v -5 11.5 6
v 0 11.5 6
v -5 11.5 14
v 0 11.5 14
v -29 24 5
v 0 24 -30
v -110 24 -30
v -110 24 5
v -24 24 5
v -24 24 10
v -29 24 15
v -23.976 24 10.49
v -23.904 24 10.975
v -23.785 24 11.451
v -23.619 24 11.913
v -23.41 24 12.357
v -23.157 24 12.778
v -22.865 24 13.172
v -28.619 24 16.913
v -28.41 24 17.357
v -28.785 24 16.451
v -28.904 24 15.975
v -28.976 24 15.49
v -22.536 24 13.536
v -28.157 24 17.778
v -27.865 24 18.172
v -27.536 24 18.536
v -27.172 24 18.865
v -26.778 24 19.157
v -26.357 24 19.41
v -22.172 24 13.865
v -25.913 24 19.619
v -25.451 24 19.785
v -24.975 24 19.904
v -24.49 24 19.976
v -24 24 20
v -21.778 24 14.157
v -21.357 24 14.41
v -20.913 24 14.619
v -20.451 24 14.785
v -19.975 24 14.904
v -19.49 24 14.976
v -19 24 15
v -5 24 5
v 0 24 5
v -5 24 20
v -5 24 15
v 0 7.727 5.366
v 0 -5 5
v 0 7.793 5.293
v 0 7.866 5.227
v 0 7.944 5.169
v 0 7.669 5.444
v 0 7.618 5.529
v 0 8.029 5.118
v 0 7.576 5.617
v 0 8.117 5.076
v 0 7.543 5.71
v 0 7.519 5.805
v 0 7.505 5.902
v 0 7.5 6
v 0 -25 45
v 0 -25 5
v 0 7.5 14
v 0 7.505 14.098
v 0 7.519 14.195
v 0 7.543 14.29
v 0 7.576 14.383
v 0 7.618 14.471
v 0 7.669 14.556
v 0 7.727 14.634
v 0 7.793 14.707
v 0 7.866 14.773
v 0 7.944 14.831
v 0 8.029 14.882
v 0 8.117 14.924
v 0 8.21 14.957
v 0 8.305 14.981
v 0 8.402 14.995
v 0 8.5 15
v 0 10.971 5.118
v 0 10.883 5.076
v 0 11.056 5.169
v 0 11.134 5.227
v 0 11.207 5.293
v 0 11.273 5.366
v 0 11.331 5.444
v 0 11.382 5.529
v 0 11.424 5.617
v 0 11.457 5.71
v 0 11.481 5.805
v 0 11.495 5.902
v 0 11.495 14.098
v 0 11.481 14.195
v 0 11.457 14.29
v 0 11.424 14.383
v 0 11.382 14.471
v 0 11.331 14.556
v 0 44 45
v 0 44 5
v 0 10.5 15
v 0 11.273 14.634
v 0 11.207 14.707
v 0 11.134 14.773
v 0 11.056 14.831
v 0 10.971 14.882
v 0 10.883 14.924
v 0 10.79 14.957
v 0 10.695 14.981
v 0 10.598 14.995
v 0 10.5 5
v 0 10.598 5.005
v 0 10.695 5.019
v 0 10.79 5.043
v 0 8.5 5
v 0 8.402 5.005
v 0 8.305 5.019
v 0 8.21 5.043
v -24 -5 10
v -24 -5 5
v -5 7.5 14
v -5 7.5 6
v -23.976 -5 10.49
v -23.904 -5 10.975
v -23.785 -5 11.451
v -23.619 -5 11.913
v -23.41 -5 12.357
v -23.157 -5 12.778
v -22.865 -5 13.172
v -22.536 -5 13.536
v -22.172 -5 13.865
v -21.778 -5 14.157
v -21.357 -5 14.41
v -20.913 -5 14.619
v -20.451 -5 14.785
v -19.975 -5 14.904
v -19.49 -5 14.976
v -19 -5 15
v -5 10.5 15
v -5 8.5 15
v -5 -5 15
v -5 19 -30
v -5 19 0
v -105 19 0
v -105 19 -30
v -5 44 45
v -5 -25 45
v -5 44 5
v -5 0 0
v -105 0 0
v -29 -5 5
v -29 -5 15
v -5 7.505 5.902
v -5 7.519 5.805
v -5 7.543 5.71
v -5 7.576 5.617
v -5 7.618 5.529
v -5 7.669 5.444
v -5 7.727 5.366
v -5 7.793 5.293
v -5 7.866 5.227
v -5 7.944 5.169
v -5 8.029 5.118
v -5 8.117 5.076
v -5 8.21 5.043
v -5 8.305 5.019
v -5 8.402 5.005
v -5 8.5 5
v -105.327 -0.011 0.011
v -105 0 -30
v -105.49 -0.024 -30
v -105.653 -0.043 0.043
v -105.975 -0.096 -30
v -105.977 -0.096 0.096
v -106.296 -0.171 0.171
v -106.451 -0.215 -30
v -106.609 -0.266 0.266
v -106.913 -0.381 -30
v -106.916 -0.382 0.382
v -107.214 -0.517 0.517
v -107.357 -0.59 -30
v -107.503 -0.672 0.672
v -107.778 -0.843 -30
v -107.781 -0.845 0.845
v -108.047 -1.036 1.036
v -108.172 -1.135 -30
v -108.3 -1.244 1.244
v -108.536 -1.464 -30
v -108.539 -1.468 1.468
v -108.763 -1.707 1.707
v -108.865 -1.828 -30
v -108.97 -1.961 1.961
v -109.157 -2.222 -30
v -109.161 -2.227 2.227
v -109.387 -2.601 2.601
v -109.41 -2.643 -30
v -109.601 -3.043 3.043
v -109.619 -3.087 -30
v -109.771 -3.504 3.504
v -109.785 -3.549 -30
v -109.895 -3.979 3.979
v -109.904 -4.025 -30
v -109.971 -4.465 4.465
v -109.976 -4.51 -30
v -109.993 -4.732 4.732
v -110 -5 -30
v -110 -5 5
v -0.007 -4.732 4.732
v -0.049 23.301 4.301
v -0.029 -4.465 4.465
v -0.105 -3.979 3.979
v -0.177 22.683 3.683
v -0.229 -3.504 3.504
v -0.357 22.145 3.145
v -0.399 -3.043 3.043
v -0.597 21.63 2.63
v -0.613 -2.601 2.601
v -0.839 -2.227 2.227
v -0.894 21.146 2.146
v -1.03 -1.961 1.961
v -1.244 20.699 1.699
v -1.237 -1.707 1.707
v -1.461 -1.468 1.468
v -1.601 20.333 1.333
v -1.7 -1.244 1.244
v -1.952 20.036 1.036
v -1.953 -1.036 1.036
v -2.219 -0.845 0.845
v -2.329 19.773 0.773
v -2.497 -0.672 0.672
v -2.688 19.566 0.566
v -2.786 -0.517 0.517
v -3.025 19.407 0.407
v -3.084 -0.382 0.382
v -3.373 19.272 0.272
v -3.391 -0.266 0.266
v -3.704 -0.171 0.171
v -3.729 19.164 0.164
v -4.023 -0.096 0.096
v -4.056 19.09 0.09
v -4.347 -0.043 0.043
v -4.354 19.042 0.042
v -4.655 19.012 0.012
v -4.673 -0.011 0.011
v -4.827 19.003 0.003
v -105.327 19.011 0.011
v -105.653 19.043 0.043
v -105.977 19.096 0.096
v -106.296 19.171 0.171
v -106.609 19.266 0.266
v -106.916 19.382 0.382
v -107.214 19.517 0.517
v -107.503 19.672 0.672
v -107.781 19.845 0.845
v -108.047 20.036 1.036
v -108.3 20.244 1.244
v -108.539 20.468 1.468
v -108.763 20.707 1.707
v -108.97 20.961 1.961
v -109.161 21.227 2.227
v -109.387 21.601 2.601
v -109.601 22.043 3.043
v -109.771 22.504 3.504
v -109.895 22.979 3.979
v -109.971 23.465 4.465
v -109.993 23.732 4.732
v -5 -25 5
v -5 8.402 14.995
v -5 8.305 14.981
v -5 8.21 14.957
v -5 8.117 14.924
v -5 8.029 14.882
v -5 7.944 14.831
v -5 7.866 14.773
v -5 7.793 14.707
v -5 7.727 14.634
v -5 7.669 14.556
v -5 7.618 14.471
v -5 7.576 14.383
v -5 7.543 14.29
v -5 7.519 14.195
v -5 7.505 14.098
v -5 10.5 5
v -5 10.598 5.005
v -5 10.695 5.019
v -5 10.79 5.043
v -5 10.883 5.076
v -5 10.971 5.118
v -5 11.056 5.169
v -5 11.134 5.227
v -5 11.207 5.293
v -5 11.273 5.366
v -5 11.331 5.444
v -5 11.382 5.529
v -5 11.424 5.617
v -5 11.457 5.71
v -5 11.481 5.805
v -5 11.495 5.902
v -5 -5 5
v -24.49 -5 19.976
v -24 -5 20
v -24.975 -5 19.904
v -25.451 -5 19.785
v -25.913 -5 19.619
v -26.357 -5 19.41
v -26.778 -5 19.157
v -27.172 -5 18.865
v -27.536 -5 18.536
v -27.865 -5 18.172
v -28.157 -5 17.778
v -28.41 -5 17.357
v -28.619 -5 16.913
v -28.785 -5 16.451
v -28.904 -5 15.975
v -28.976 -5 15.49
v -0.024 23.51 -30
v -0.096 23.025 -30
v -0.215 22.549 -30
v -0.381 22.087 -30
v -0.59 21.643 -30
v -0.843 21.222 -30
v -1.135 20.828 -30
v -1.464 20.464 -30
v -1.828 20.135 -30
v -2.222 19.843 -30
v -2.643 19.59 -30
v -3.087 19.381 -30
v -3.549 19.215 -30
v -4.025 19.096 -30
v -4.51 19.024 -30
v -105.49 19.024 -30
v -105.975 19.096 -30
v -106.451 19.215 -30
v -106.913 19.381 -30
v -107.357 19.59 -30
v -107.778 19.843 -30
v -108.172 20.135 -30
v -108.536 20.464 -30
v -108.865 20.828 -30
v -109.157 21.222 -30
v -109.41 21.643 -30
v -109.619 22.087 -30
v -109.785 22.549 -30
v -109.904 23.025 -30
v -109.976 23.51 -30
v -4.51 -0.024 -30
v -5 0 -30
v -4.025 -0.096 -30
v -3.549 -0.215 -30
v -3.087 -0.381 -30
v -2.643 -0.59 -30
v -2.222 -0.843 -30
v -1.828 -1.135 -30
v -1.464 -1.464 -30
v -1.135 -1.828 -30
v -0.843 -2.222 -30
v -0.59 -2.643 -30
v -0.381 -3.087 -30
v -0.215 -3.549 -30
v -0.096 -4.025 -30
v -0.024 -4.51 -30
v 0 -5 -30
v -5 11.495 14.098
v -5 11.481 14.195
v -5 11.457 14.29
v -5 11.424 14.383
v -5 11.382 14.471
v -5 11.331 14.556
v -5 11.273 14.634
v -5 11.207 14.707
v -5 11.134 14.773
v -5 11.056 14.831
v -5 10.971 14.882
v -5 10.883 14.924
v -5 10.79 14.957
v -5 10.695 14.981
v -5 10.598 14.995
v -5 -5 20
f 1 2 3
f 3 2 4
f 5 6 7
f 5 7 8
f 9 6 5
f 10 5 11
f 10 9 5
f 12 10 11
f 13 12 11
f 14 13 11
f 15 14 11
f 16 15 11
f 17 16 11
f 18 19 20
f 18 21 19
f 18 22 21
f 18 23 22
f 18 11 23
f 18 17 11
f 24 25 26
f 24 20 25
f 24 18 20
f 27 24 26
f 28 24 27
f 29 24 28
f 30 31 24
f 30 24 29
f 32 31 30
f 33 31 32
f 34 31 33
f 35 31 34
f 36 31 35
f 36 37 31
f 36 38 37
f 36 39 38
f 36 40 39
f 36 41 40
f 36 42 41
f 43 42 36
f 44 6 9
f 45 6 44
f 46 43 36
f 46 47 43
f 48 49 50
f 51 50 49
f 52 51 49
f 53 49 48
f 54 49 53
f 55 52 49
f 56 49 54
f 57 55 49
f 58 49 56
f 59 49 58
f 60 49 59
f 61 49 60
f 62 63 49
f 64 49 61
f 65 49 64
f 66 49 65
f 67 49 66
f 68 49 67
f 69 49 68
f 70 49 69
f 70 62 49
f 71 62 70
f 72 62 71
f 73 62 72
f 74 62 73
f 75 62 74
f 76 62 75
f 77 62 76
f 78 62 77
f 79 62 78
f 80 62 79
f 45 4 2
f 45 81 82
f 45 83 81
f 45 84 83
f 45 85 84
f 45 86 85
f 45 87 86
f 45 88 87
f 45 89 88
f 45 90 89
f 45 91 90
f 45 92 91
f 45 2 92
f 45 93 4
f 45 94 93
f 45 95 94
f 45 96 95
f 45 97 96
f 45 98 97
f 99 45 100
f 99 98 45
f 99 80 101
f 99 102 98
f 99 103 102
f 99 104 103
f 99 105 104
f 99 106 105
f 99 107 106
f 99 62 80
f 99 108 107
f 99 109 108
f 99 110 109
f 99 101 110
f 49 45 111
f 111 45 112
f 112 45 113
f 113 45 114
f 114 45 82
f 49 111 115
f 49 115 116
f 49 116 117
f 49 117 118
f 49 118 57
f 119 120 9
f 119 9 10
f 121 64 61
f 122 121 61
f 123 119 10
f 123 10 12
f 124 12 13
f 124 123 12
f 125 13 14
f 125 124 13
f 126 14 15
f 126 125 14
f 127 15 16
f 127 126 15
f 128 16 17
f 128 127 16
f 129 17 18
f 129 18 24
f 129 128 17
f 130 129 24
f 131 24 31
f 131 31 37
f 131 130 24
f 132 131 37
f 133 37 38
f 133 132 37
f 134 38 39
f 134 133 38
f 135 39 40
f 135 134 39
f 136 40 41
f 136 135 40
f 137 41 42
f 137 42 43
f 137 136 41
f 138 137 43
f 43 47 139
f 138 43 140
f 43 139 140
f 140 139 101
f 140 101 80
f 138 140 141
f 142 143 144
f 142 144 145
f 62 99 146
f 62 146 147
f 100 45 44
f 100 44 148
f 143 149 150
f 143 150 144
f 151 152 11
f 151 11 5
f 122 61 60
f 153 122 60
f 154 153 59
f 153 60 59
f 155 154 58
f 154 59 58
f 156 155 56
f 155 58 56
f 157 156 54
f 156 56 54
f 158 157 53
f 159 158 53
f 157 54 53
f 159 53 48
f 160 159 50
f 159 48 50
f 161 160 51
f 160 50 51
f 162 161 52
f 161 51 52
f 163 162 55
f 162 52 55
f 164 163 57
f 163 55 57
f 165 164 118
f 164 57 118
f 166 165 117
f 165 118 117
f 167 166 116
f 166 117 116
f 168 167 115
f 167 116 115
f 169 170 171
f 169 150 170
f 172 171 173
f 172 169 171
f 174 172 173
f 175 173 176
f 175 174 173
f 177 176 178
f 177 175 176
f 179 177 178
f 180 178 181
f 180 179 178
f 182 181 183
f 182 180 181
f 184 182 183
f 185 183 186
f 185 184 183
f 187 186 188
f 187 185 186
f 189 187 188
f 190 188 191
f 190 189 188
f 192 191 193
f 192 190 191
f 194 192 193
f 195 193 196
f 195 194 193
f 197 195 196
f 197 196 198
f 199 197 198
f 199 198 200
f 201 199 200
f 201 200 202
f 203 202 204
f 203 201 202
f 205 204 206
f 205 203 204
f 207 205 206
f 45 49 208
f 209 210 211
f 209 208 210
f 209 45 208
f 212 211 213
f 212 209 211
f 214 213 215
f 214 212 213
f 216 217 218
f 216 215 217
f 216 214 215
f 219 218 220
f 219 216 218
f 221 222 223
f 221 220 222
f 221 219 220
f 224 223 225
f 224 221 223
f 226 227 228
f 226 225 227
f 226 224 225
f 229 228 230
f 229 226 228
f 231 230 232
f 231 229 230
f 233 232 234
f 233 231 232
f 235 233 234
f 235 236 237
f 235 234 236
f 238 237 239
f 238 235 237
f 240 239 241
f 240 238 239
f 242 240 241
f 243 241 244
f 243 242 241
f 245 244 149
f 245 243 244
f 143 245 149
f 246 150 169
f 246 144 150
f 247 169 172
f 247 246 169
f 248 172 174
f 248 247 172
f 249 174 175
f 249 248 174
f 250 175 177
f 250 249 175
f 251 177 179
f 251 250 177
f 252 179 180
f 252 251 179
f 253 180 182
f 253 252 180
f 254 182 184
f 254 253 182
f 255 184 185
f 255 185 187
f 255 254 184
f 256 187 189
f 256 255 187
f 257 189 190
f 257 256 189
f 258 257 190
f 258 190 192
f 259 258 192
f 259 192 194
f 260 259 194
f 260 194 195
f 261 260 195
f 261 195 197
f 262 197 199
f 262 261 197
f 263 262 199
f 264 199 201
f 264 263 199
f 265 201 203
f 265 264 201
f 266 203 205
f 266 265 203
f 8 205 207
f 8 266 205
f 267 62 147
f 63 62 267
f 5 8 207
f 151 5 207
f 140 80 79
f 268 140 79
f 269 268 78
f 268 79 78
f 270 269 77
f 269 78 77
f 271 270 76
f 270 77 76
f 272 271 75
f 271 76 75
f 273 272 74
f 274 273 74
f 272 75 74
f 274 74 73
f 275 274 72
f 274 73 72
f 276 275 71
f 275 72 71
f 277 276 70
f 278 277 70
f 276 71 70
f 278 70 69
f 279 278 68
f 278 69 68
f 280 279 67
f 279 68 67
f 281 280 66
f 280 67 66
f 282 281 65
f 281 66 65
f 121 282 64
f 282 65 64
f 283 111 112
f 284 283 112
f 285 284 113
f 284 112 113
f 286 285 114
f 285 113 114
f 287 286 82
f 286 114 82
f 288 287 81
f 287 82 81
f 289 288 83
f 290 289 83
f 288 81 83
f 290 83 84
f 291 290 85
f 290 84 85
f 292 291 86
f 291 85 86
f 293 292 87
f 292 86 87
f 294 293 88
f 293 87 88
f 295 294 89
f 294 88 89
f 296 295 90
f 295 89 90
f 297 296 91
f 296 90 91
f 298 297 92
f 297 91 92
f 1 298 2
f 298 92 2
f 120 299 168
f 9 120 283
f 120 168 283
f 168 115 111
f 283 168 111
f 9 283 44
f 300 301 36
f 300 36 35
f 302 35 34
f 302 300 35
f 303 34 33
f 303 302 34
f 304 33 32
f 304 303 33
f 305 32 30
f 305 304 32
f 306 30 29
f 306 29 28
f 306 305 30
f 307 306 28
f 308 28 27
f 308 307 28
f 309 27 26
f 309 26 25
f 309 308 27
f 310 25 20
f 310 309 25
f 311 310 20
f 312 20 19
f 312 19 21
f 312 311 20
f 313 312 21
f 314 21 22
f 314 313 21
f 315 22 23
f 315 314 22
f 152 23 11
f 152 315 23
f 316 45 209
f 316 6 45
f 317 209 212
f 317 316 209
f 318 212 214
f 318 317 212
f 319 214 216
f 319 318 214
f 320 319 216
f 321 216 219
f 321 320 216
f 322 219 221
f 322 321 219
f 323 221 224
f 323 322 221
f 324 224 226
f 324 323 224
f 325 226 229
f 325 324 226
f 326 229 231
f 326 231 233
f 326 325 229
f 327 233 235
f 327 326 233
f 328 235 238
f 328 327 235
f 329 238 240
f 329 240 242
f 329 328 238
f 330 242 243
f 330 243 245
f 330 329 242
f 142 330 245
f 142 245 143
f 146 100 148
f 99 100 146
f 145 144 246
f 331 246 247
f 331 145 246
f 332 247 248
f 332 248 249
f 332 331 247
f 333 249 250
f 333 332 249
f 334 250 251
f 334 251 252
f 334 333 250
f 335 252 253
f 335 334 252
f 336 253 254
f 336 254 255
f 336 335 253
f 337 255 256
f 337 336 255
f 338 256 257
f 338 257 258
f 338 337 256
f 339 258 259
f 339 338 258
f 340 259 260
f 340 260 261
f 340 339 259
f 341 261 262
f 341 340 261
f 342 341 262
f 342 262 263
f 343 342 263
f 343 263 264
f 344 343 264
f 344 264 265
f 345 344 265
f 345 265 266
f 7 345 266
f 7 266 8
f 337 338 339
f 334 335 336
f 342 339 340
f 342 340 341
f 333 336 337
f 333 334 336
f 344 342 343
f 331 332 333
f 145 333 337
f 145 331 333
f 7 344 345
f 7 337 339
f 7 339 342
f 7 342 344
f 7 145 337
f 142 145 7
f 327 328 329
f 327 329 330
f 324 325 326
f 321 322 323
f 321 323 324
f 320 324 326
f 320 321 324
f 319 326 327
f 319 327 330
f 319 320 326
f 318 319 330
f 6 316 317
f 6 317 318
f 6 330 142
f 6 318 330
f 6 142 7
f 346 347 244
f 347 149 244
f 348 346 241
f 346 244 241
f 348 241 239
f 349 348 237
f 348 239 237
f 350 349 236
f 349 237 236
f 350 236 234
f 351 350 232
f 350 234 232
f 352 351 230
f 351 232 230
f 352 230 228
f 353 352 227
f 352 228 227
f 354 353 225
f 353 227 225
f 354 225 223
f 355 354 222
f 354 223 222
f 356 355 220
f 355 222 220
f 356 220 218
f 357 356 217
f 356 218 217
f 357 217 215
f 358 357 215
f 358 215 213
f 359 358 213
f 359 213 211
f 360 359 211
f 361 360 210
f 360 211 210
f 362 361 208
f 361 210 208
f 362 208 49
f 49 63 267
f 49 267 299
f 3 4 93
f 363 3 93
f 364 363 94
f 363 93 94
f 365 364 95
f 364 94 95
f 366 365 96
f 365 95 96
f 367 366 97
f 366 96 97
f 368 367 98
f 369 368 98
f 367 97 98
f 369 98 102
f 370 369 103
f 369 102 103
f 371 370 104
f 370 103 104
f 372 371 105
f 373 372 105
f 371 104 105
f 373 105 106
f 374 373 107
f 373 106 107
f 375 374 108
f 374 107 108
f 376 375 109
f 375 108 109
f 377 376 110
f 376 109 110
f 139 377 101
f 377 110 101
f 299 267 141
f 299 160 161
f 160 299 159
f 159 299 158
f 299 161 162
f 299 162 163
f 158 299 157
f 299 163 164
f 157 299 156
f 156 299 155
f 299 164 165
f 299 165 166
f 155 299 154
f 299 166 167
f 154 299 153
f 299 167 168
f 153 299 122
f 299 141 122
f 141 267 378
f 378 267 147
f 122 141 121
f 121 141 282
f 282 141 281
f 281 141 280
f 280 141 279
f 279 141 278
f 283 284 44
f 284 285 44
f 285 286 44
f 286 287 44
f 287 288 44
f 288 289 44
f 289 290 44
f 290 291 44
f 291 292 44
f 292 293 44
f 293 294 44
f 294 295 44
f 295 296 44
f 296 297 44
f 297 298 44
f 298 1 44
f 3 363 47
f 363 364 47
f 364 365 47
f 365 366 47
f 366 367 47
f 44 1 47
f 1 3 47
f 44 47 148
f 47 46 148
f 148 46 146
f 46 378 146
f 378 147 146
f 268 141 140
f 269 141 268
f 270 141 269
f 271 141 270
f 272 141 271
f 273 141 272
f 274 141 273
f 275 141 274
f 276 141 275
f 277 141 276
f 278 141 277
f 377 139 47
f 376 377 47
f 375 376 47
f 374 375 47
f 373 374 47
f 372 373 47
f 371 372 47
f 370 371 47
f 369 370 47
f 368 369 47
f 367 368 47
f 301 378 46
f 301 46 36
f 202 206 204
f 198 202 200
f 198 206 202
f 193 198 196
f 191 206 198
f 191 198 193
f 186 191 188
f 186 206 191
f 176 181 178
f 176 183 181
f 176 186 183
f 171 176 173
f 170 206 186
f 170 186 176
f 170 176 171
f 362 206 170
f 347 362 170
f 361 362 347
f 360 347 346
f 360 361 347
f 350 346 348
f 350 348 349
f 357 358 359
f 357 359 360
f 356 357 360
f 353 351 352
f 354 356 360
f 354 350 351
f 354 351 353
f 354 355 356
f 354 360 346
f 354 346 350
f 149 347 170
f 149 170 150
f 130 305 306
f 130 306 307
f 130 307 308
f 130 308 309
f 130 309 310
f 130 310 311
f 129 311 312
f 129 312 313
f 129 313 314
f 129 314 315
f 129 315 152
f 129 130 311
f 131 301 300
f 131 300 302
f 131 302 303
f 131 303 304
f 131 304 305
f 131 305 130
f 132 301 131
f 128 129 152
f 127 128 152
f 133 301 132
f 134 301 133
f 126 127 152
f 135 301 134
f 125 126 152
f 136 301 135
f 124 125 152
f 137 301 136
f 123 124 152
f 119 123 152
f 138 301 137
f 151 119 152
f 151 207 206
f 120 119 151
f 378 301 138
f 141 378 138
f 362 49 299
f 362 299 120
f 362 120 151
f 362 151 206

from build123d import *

# Parameters (mm, degrees)
F1_DEPTH = 110
F3_DEPTH = 5
F5_DEPTH = 29
F7_DEPTH = 5
F8_R     = 4.99999
F9_R     = 4.99999


# Not quite as in the source:
# - a fillet or chamfer is up to 0.001 mm smaller than in the source, because OpenCascade refuses the exact size


with BuildPart() as f1:
    # F0 (on Right) → F1 (new body)
    with BuildSketch(Plane.YZ):
        Polygon((-5, -30), (0, -30), (0, 0), (19, 0), (19, -30), (24, -30), (24, 5), (-5, 5), align=None)
    extrude(amount=-F1_DEPTH)

    # F2 (on face) → F3 (join)
    with BuildSketch(Plane.YZ):
        Polygon((-25, 5), (-5, 5), (24, 5), (44, 5), (44, 45), (-25, 45), align=None)
    extrude(amount=-F3_DEPTH)

    # F4 (on face) → F5 (join, through all)
    with BuildSketch(Plane.XZ.offset(5)):
        with BuildLine():
            Line((-19, 15), (-5, 15))
            Line((-5, 15), (-5, 20))
            Line((-5, 20), (-24, 20))
            ThreePointArc((-24, 20), (-27.5355339059, 18.5355339059), (-29, 15))
            Line((-29, 15), (-29, 5))
            Line((-29, 5), (-24, 5))
            Line((-24, 5), (-24, 10))
            ThreePointArc((-24, 10), (-22.5355339059, 13.5355339059), (-19, 15))
        make_face()
    extrude(amount=-F5_DEPTH)

    # F6 (on face) → F7 (cut, through all)
    with BuildSketch(Plane.YZ):
        with BuildLine():
            Line((8.5, 5), (9.5, 5))
            Line((9.5, 5), (10.5, 5))
            ThreePointArc((10.5, 5), (11.2071067812, 5.2928932188), (11.5, 6))
            Line((11.5, 6), (11.5, 14))
            ThreePointArc((11.5, 14), (11.2071067812, 14.7071067812), (10.5, 15))
            Line((10.5, 15), (8.5, 15))
            ThreePointArc((8.5, 15), (7.7928932188, 14.7071067812), (7.5, 14))
            Line((7.5, 14), (7.5, 6))
            ThreePointArc((7.5, 6), (7.7928932188, 5.2928932188), (8.5, 5))
        make_face()
    extrude(amount=-F7_DEPTH, mode=Mode.SUBTRACT)

    # F8 (radius 5 in the source; OpenCascade refuses exactly that, so slightly less here)
    f8_edges = [f1.edges().sort_by_distance(p)[0] for p in [
        (-110, 19, -15),
        (-110, 9.5, 0),
        (-110, 0, -15),
    ]]
    fillet(f8_edges, radius=F8_R)

    # F9 (radius 5 in the source; OpenCascade refuses exactly that, so slightly less here)
    f9_edges = [f1.edges().sort_by_distance(p)[0] for p in [
        (0, 0, -15),
        (0, 19, -15),
        (0, 9.5, 0),
    ]]
    fillet(f9_edges, radius=F9_R)


solid = f1.part
